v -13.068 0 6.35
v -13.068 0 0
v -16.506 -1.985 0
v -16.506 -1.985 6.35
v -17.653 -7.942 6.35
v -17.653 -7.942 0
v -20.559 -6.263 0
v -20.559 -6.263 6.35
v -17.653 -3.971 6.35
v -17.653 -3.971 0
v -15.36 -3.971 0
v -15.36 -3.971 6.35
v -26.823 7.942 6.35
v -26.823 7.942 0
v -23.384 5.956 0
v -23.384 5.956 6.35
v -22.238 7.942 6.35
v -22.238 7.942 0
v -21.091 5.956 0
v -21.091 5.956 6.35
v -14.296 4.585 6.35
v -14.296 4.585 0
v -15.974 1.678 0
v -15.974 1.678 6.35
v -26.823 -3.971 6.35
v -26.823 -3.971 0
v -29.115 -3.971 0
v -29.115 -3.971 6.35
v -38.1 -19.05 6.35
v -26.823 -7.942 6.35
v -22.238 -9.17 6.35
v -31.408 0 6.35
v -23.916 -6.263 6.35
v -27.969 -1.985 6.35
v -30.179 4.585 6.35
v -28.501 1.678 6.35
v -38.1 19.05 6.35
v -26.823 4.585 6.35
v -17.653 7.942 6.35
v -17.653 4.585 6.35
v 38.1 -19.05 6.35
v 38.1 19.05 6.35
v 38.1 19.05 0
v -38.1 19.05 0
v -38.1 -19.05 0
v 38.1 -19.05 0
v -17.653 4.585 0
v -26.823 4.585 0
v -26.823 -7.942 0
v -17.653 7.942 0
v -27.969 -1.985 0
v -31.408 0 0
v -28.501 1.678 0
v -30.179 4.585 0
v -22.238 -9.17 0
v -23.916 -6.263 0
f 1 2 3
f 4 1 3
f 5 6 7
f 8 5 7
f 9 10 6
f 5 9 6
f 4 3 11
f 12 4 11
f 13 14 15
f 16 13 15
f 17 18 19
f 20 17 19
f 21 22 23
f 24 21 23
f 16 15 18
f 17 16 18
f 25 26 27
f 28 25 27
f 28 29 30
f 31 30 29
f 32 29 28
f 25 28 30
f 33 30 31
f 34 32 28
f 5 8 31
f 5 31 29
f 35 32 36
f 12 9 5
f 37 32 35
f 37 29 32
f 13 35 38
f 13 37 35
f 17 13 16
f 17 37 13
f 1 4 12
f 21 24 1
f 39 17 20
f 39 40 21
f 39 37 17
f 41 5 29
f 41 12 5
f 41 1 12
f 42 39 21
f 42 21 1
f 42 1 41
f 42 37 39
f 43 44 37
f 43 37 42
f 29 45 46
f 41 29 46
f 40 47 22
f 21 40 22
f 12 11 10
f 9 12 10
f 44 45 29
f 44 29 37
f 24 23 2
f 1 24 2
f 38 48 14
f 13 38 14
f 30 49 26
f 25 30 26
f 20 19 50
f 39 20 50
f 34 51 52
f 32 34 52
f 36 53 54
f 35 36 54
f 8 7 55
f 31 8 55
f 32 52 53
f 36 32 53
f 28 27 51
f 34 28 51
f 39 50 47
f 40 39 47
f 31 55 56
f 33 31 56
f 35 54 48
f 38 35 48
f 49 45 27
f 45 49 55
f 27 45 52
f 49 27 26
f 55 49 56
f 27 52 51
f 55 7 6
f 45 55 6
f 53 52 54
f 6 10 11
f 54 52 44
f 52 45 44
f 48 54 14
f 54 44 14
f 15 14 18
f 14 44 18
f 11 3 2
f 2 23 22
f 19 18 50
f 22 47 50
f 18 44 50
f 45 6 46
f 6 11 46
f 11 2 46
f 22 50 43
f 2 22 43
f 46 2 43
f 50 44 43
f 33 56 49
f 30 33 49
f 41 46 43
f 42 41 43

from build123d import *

# Parameters (mm, degrees)
F0_W     = 76.2
F0_H     = 38.1
F1_DEPTH = 6.35


with BuildPart() as f1:
    # F0 (on Top) → F1 (new body)
    with BuildSketch(Plane.XY):
        Rectangle(F0_W, F0_H)
        Polygon((-21.091462, 5.95622), (-17.652636, 7.941627), (-17.652636, 4.5851), (-14.29611, 4.5851), (-15.974373, 1.678263), (-13.067536, 0), (-16.506361, -1.985407), (-15.360086, -3.970813), (-17.652636, -3.970813), (-17.652636, -7.941627), (-20.559474, -6.263364), (-22.237737, -9.170201), (-23.916, -6.263364), (-26.822837, -7.941627), (-26.822837, -3.970813), (-29.115387, -3.970813), (-27.969112, -1.985407), (-31.407937, 0), (-28.5011, 1.678263), (-30.179363, 4.5851), (-26.822837, 4.5851), (-26.822837, 7.941627), (-23.384012, 5.95622), (-22.237737, 7.941627), align=None, mode=Mode.SUBTRACT)
    extrude(amount=F1_DEPTH)


solid = f1.part
